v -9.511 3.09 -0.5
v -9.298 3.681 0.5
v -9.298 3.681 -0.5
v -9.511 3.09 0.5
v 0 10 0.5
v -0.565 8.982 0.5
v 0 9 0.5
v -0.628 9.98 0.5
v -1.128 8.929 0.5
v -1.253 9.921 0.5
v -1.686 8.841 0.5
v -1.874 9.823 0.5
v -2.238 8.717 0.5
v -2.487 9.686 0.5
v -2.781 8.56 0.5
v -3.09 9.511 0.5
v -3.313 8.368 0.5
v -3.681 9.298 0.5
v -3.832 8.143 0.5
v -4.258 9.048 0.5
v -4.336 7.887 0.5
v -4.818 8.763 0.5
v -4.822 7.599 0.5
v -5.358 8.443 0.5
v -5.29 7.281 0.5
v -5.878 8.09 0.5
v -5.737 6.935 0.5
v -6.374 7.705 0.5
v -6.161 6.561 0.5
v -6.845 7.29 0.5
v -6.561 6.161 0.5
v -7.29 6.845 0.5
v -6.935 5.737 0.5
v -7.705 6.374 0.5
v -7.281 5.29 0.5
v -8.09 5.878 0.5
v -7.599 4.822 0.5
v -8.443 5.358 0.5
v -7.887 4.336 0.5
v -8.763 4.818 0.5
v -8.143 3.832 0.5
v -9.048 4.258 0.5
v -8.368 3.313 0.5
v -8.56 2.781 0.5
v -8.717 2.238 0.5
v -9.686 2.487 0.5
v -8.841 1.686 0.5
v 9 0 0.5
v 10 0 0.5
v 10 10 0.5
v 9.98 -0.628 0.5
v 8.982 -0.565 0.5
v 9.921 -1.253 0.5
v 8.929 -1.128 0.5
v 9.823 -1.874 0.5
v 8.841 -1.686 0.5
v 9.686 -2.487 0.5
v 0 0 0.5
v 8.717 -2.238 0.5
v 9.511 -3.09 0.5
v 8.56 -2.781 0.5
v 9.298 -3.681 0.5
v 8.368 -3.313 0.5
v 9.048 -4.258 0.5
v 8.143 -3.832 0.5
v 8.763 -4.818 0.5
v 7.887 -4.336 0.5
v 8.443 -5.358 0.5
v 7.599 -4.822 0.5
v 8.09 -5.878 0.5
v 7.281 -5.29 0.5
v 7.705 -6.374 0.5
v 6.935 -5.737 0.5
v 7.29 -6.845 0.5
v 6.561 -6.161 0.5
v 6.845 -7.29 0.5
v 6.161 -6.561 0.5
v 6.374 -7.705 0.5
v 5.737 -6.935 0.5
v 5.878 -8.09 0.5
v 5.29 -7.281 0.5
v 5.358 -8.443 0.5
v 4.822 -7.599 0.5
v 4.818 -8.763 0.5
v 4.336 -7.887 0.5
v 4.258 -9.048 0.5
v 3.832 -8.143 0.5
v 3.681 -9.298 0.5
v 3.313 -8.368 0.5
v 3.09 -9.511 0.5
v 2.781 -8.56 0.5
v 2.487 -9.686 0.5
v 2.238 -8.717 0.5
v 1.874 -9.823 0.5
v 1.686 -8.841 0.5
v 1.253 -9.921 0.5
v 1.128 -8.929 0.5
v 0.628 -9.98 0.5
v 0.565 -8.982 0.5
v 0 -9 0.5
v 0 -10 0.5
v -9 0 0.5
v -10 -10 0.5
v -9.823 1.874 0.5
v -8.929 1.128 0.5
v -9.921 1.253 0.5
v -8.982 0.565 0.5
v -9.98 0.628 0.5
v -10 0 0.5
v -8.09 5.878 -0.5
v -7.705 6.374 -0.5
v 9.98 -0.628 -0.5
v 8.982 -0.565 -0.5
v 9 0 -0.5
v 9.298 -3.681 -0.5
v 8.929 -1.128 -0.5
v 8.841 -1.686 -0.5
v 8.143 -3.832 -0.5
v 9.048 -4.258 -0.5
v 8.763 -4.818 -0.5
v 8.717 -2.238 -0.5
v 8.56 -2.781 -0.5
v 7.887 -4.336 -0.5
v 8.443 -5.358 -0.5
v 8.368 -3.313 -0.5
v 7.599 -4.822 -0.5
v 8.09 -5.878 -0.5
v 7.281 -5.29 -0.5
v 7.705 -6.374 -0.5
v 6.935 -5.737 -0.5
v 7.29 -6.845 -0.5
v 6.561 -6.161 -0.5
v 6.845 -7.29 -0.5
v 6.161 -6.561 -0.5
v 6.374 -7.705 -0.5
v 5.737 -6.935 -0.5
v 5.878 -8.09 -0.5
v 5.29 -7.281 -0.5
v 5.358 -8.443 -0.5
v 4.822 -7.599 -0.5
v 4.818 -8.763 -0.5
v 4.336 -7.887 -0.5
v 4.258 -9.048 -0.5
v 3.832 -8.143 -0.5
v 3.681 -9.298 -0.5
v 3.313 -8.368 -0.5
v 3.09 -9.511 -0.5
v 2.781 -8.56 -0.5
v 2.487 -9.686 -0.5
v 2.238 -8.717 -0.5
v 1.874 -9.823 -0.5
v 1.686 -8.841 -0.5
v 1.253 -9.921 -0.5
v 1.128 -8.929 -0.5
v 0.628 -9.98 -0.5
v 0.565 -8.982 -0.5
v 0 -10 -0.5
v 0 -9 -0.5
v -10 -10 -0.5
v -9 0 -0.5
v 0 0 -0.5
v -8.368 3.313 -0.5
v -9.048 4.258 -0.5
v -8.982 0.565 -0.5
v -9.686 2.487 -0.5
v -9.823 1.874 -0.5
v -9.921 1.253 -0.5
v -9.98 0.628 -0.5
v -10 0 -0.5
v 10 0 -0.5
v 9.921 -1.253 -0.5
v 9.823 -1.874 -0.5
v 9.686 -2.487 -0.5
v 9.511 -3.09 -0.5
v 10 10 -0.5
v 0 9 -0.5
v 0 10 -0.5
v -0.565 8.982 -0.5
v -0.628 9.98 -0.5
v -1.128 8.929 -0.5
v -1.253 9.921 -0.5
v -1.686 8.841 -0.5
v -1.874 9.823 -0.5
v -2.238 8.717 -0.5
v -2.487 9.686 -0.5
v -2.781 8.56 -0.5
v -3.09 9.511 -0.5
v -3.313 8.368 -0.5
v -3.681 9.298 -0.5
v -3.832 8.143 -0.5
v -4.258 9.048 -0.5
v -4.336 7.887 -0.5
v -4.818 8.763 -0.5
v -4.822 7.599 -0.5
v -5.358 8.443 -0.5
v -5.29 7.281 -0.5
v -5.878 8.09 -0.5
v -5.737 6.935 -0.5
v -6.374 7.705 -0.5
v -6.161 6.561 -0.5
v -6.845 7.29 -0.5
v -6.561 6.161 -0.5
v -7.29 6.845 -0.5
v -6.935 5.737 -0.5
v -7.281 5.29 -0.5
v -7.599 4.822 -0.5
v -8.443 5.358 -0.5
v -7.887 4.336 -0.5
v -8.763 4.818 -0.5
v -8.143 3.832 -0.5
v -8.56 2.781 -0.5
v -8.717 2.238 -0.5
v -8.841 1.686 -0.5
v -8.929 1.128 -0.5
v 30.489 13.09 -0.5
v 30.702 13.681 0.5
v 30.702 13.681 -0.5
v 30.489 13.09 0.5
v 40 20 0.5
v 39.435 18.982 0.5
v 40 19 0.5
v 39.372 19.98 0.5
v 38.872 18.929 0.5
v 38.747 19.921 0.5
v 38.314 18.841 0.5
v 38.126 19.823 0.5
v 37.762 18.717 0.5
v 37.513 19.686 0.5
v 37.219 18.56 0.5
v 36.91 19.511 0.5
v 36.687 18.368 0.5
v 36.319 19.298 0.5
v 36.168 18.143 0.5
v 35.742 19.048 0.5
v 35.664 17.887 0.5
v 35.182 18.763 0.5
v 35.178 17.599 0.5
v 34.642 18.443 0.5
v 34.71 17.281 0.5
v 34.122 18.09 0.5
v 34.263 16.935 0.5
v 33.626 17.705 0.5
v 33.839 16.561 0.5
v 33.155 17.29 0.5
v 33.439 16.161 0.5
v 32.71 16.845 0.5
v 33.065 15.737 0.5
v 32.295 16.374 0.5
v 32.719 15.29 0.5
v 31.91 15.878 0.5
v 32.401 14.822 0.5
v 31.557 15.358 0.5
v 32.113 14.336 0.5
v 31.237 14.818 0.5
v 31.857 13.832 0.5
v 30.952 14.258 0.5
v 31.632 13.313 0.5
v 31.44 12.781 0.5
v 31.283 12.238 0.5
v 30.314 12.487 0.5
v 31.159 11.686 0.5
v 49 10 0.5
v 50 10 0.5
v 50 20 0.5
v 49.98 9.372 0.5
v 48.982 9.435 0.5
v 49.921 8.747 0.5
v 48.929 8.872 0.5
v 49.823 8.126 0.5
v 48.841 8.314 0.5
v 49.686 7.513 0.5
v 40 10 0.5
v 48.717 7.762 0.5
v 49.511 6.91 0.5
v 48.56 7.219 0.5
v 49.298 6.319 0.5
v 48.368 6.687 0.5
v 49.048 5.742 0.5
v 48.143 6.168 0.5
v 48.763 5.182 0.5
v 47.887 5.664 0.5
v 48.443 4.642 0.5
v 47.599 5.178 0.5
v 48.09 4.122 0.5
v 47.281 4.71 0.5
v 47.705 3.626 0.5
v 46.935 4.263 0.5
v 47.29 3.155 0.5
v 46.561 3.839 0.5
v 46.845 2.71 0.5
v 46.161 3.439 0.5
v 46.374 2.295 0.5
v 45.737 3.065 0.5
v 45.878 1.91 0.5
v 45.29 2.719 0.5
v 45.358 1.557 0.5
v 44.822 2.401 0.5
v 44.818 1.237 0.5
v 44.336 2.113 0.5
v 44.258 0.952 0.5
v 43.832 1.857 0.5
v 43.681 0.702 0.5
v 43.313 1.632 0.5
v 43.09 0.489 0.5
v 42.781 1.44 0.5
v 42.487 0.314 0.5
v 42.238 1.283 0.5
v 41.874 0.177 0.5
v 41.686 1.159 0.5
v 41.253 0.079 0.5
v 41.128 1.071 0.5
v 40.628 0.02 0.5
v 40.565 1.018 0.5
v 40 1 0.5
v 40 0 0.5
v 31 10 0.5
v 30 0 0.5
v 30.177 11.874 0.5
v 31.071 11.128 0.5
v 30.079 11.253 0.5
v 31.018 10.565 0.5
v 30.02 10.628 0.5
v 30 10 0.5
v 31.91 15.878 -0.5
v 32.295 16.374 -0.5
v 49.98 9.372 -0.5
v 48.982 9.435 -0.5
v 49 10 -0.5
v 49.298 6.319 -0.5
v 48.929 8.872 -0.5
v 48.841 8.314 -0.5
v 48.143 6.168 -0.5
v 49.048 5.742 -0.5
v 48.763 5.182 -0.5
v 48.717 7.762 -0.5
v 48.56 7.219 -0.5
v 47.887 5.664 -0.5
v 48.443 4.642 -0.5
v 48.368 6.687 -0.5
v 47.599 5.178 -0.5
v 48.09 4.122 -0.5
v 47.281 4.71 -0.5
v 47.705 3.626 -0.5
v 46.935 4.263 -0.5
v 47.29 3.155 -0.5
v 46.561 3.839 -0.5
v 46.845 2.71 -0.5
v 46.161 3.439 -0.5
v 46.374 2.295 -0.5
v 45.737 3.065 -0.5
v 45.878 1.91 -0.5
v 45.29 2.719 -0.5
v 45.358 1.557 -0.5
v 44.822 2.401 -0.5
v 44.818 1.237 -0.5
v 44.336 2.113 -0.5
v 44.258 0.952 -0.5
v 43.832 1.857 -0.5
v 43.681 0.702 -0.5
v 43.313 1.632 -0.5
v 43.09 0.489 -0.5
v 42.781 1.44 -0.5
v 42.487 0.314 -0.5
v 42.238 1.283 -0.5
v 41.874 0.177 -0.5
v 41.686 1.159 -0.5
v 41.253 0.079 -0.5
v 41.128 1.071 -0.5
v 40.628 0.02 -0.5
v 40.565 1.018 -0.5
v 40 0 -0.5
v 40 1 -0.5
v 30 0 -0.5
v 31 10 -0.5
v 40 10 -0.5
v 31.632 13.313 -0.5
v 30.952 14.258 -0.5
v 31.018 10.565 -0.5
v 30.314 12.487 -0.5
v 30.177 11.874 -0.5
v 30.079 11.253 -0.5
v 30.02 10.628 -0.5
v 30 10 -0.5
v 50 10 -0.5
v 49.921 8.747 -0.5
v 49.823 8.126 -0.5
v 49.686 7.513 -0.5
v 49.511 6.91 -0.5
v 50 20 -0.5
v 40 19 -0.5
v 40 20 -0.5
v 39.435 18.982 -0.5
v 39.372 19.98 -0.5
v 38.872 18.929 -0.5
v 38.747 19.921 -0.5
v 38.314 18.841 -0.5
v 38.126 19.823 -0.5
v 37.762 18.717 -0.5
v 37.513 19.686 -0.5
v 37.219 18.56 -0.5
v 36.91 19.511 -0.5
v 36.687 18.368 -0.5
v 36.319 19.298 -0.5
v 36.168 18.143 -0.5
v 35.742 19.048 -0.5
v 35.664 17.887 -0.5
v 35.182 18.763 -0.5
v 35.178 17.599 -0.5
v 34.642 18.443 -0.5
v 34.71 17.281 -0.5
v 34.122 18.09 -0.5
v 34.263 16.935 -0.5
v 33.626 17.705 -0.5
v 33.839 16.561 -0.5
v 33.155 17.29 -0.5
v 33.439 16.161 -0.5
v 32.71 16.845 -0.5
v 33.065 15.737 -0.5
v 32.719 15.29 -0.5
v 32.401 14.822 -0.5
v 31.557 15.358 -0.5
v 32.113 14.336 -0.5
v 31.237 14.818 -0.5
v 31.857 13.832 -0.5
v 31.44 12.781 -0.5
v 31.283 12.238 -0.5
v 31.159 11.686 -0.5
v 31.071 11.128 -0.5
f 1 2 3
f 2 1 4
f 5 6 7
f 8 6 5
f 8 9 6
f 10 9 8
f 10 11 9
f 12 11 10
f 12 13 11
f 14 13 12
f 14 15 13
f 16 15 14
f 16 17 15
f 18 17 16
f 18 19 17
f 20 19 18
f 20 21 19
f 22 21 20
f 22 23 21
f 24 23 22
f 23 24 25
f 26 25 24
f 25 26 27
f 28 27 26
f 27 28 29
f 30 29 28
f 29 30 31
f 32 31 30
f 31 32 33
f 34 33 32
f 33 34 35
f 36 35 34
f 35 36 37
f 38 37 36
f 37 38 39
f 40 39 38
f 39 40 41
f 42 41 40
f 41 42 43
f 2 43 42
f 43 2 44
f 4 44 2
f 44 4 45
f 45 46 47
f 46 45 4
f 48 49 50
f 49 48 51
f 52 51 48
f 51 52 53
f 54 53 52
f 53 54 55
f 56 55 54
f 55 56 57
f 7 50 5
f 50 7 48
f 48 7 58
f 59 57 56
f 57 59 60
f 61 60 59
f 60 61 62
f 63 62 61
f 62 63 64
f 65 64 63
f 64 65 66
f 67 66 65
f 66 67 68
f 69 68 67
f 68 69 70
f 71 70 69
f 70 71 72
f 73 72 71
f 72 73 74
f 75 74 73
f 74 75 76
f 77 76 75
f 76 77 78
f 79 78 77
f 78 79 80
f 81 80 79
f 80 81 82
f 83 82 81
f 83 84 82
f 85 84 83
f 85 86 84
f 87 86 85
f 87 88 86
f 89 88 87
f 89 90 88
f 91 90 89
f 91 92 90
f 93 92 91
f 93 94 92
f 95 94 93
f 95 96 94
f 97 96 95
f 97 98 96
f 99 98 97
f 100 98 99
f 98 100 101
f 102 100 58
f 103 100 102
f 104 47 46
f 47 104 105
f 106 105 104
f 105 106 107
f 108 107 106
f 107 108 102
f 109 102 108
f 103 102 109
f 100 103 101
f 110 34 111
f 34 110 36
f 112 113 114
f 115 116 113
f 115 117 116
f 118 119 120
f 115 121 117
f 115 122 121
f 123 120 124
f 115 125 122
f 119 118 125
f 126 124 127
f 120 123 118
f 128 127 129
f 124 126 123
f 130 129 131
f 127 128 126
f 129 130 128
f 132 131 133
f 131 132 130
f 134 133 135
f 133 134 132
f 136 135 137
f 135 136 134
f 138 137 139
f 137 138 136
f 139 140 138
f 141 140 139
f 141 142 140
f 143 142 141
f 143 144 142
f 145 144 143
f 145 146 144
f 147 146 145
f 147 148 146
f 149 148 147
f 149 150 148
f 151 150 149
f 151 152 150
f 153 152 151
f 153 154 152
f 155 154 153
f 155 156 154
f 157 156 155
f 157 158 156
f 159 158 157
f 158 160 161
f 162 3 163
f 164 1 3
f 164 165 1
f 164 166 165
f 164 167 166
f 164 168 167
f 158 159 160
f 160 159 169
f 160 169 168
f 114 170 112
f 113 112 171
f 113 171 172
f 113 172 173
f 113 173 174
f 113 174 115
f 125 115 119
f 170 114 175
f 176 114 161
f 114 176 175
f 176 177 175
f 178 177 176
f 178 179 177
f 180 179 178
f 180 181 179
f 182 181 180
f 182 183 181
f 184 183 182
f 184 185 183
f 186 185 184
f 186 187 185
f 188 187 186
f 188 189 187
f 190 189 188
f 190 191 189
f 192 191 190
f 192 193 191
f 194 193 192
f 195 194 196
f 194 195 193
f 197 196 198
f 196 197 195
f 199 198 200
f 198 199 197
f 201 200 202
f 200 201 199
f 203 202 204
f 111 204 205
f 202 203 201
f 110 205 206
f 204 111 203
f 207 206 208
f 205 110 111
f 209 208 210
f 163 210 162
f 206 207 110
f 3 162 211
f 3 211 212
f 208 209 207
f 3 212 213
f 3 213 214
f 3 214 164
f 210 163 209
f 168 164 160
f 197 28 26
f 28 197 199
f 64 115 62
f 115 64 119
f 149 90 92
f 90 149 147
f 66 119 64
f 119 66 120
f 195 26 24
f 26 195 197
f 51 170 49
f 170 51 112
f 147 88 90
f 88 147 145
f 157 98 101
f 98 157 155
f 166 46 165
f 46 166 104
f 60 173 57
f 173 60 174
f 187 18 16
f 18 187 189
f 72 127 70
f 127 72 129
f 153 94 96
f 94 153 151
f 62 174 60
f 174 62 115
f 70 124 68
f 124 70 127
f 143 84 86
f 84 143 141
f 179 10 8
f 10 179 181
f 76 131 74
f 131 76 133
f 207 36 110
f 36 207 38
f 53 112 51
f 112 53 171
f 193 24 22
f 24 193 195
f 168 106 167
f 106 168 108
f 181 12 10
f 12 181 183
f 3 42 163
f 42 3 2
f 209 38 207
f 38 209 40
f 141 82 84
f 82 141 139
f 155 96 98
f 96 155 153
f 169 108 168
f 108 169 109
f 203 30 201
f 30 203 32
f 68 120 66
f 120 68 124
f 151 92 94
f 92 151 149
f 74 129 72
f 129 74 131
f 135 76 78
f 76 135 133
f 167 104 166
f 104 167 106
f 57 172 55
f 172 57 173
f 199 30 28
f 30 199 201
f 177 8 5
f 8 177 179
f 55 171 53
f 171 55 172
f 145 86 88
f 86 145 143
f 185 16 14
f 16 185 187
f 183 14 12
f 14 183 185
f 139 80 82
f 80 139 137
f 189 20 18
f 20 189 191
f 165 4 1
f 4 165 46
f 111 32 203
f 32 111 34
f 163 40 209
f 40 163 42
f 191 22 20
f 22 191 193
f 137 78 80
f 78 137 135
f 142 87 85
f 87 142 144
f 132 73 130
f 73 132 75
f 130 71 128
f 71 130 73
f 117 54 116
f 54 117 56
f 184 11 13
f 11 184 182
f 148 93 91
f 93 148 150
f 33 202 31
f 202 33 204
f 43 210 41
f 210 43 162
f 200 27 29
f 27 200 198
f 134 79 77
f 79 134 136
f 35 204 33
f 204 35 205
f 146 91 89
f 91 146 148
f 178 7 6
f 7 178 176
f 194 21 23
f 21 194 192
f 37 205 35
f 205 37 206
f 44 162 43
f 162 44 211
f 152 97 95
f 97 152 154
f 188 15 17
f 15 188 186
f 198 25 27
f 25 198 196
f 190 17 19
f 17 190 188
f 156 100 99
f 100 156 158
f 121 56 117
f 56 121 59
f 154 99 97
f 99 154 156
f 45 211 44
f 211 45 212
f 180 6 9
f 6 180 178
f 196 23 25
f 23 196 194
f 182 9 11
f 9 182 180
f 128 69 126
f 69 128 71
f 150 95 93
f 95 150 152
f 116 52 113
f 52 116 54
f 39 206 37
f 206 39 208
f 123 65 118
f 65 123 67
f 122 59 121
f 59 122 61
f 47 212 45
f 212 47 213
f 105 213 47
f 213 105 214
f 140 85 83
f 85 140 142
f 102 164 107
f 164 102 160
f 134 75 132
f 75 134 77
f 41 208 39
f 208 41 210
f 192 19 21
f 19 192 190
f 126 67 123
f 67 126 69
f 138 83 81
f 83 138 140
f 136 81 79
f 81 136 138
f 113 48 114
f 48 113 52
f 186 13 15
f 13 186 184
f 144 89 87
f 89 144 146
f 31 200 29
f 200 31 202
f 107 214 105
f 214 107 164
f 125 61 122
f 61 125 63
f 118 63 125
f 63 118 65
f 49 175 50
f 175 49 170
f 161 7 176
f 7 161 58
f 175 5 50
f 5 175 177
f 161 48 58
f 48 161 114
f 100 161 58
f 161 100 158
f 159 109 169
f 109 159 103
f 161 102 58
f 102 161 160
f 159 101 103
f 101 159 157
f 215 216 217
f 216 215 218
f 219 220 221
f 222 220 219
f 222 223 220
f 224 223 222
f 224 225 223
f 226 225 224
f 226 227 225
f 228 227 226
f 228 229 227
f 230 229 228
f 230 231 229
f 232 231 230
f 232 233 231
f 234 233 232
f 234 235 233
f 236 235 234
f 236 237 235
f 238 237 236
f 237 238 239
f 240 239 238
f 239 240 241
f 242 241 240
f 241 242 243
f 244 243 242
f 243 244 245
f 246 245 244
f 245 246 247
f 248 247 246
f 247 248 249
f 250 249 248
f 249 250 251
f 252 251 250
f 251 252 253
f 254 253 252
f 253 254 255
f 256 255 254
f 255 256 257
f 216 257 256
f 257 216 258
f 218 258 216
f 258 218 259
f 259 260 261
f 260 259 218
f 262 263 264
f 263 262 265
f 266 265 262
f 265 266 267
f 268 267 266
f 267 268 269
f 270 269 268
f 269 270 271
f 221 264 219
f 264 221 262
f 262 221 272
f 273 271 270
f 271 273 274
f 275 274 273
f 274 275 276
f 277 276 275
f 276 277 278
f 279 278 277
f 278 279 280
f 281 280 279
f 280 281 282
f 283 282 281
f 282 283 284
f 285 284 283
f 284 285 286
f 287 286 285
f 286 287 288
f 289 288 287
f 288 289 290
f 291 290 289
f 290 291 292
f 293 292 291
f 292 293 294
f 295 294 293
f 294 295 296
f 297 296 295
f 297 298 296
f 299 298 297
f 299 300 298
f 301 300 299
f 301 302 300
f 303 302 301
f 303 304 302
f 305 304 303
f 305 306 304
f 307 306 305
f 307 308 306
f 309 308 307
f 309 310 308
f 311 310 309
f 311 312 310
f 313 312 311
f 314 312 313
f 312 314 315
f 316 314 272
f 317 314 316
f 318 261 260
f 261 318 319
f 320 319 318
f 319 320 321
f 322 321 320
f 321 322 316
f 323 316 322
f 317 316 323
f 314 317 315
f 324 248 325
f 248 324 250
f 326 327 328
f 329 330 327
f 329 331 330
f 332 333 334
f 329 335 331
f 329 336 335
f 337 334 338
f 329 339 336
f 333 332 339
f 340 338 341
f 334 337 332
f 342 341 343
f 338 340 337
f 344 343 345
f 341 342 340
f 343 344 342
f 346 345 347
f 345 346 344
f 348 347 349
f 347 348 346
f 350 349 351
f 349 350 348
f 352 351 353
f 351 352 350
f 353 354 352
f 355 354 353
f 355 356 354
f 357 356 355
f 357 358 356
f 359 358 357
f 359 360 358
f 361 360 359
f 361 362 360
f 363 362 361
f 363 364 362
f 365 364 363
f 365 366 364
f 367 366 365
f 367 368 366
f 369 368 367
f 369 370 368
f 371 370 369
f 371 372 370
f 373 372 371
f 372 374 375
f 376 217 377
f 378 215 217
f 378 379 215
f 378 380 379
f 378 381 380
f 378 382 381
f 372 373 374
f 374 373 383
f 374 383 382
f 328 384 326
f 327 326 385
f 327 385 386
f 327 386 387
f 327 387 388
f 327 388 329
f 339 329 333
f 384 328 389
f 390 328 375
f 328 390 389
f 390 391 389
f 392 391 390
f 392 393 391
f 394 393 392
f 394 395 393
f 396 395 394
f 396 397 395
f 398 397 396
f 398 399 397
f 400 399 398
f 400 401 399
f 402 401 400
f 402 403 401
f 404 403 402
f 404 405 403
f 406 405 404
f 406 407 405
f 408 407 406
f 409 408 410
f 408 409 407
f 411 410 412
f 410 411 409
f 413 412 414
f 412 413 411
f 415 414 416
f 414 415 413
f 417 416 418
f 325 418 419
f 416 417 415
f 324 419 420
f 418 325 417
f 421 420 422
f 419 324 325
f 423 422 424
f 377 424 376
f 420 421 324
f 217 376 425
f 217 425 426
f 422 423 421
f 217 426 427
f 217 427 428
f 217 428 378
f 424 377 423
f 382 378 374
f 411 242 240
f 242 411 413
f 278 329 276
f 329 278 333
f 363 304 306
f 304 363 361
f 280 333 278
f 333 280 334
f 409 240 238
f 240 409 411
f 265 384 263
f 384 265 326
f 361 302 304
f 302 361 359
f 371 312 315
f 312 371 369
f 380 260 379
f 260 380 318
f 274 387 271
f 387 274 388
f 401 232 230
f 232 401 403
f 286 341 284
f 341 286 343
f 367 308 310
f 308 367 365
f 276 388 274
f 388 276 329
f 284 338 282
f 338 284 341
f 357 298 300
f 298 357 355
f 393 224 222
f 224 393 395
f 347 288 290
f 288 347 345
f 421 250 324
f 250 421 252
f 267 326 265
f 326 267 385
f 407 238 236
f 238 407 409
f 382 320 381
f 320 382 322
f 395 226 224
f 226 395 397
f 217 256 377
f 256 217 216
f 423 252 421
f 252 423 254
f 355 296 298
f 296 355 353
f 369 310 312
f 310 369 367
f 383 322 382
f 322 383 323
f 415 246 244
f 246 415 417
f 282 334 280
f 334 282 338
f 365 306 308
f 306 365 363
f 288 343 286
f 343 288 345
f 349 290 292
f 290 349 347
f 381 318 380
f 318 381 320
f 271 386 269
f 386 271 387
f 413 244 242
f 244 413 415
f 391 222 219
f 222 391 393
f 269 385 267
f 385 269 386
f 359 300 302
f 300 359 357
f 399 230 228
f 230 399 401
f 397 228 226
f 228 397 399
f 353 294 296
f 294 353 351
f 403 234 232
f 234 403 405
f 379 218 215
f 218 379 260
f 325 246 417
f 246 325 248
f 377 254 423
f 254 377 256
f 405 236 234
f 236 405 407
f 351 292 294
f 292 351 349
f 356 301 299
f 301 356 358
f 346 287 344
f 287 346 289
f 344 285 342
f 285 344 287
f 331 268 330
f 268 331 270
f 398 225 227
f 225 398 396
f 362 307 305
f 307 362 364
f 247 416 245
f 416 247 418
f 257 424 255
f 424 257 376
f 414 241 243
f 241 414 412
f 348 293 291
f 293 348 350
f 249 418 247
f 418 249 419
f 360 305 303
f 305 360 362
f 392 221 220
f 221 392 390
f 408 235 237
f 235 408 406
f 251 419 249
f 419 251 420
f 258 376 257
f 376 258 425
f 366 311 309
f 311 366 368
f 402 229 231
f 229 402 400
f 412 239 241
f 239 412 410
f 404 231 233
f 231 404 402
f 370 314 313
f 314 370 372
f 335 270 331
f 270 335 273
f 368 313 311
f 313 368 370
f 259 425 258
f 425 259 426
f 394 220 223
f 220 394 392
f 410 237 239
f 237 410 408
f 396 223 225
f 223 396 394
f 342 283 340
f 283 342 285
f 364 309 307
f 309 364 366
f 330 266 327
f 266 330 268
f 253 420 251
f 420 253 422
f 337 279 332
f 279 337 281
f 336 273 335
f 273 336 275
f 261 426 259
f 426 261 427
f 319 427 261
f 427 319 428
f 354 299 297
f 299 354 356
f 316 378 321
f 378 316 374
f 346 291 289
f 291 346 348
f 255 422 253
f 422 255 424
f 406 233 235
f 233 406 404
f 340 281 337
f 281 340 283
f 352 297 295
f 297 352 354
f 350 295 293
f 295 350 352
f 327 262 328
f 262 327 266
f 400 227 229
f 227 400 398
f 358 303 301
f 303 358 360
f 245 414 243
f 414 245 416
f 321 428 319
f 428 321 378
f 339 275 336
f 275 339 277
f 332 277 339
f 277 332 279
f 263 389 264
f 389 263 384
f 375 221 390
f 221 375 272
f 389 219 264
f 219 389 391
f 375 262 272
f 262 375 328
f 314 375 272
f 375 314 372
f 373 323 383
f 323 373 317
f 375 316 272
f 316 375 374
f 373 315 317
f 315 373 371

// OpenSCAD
// file: ref.scad
fid_size = 10;
fid_thk = 1;
fid = [fid_size, fid_size, fid_thk];
fudge = 0.1;

module fiducial(posn=[0,0,0]) {
  translate(posn) {
    translate([+0.5*fid.x, +0.5*fid.y, 0])
      cube( fid, center=true );
    translate([-0.5*fid.x, -0.5*fid.y, 0])
      cube( fid, center=true );
    difference() {
      cylinder(r=fid_size, h=fid_thk, center=true, $fn = 100);
      cylinder(r=fid_size-fid_thk, h=fid_thk+fudge, center=true, $fn = 100);
    }
  }
}

fiducial();
// main file
include <ref.scad>
//use <enc.scad>

color("green")
fiducial([40,10,0]);
echo( fid_thk, fid_thk );
